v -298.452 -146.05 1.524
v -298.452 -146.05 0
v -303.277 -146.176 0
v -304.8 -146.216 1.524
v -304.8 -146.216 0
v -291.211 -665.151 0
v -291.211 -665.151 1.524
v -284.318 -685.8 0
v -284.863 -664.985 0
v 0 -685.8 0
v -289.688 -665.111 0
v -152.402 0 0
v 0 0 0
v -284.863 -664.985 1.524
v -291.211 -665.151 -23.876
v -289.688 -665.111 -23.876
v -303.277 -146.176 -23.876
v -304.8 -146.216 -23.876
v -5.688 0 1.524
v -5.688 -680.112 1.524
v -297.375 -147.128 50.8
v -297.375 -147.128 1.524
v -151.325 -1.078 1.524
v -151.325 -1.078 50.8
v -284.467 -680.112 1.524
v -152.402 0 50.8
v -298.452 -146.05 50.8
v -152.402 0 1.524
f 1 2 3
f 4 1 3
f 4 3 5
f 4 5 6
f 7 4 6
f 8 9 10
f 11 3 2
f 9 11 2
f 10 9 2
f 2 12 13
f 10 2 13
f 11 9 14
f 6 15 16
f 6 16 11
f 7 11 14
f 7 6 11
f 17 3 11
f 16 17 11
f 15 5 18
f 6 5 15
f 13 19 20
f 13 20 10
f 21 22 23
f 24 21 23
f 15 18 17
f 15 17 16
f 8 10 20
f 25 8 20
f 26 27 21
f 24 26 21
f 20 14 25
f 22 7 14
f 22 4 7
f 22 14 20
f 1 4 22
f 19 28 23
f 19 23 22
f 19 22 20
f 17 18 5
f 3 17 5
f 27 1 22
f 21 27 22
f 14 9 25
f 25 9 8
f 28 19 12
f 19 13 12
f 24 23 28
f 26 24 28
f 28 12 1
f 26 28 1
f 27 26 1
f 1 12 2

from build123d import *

# Parameters (mm, degrees)
F2_DEPTH  = 1.524
F3_W      = 519.1125
F3_H      = 25.4
F4_DEPTH  = 1.524
F6_DEPTH  = 50.8
F8_DEPTH  = 685.801
F10_DEPTH = 304.801


# Not quite as in the source:
# - a variable given as a bare number and used for a length is read in inches; the dataset says mm whatever the document's units were


with BuildPart() as f2:
    # F1 (on Top) → F2 (new body)
    with BuildSketch(Plane.XY):
        Polygon((0, 0), (-152.4021759864, 0), (-298.4521759864, -146.05), (-304.8, -146.2162236218), (-291.2112189215, -665.1508367331), (-284.8633949079, -664.9846131114), (-284.3183248194, -685.8), (0, -685.8), align=None)
    extrude(amount=F2_DEPTH)

    # F3 (on face) → F4 (join)
    with BuildSketch(Plane(origin=(-308.4173240373, -8.0761918578, 0), x_dir=(0.0261769483, -0.999657325, 0), z_dir=(-0.999657325, -0.0261769483, 0))):
        with Locations((397.7436351295, -11.176)):
            Rectangle(F3_W, F3_H)
    extrude(amount=-F4_DEPTH)

    # F5 (on Top) → F6 (join)
    with BuildSketch(Plane.XY):
        Polygon((-152.4021759864, 0), (-298.4521759864, -146.05), (-297.3745452519, -147.1276307345), (-151.3245452519, -1.0776307345), align=None)
    extrude(amount=F6_DEPTH)

    # F7 (on Front) → F8 (cut, through all)
    with BuildSketch(Plane.XZ):
        Polygon((6.35, 4.6485226281), (-17.3485226281, 4.6485226281), (6.35, -1.7014773719), align=None)
    extrude(amount=F8_DEPTH, mode=Mode.SUBTRACT)

    # F9 (on Right) → F10 (cut, through all)
    with BuildSketch(Plane.YZ):
        Polygon((-668.4514773719, 4.6485226281), (-692.15, 4.6485226281), (-692.15, -1.7014773719), align=None)
    extrude(amount=-F10_DEPTH, mode=Mode.SUBTRACT)


solid = f2.part
